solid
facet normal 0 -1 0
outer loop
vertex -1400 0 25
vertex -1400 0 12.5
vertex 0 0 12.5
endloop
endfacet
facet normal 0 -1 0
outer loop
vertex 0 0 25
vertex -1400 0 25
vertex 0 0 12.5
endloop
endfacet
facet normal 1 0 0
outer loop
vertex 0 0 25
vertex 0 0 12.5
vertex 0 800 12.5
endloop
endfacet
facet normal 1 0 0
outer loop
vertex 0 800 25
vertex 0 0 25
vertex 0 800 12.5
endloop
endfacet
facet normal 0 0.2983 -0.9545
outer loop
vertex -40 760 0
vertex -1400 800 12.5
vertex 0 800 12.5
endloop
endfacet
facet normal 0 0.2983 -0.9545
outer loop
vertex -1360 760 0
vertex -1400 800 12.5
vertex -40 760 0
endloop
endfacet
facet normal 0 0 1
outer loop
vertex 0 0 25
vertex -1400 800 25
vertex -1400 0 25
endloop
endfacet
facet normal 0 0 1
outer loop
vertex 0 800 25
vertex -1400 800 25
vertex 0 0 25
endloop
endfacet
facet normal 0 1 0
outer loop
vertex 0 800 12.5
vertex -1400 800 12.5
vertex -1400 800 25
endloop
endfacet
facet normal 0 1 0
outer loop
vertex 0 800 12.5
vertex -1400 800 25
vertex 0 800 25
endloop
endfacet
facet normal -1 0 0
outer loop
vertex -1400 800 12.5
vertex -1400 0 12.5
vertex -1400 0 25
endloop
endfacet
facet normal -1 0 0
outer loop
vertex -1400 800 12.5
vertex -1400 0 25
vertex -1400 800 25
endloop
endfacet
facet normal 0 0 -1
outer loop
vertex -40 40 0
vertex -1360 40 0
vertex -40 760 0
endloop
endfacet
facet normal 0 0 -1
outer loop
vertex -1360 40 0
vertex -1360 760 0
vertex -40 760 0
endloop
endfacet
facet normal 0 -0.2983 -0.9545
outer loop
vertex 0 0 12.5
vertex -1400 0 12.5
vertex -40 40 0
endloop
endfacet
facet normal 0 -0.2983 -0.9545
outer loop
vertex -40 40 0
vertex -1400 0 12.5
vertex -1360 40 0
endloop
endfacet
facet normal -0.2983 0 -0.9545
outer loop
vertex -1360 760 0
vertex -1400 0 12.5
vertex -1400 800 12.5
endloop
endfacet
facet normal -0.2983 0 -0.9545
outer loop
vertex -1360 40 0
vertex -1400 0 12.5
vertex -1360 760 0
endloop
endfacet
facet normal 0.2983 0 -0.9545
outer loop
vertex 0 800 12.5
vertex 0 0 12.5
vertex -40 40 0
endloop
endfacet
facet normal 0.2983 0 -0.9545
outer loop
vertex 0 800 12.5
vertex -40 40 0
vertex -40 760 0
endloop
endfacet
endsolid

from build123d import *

# Parameters (mm, degrees)
F0_W     = 1400
F0_H     = 800
F1_DEPTH = 25
F2_SIZE2 = 12.5
F2_SIZE  = 40


with BuildPart() as f1:
    # F0 (on Top) → F1 (new body)
    with BuildSketch(Plane.XY):
        with Locations((-700, 400)):
            Rectangle(F0_W, F0_H)
    extrude(amount=F1_DEPTH)

    # F2
    f2_edges = [f1.edges().sort_by_distance(p)[0] for p in [
        (-700, 0, 0),
        (0, 400, 0),
        (-700, 800, 0),
        (-1400, 400, 0),
    ]]
    f2_side = f1.faces().sort_by_distance((-700, 400, 0))[0]
    chamfer(f2_edges, length=F2_SIZE, length2=F2_SIZE2, reference=f2_side)


solid = f1.part
